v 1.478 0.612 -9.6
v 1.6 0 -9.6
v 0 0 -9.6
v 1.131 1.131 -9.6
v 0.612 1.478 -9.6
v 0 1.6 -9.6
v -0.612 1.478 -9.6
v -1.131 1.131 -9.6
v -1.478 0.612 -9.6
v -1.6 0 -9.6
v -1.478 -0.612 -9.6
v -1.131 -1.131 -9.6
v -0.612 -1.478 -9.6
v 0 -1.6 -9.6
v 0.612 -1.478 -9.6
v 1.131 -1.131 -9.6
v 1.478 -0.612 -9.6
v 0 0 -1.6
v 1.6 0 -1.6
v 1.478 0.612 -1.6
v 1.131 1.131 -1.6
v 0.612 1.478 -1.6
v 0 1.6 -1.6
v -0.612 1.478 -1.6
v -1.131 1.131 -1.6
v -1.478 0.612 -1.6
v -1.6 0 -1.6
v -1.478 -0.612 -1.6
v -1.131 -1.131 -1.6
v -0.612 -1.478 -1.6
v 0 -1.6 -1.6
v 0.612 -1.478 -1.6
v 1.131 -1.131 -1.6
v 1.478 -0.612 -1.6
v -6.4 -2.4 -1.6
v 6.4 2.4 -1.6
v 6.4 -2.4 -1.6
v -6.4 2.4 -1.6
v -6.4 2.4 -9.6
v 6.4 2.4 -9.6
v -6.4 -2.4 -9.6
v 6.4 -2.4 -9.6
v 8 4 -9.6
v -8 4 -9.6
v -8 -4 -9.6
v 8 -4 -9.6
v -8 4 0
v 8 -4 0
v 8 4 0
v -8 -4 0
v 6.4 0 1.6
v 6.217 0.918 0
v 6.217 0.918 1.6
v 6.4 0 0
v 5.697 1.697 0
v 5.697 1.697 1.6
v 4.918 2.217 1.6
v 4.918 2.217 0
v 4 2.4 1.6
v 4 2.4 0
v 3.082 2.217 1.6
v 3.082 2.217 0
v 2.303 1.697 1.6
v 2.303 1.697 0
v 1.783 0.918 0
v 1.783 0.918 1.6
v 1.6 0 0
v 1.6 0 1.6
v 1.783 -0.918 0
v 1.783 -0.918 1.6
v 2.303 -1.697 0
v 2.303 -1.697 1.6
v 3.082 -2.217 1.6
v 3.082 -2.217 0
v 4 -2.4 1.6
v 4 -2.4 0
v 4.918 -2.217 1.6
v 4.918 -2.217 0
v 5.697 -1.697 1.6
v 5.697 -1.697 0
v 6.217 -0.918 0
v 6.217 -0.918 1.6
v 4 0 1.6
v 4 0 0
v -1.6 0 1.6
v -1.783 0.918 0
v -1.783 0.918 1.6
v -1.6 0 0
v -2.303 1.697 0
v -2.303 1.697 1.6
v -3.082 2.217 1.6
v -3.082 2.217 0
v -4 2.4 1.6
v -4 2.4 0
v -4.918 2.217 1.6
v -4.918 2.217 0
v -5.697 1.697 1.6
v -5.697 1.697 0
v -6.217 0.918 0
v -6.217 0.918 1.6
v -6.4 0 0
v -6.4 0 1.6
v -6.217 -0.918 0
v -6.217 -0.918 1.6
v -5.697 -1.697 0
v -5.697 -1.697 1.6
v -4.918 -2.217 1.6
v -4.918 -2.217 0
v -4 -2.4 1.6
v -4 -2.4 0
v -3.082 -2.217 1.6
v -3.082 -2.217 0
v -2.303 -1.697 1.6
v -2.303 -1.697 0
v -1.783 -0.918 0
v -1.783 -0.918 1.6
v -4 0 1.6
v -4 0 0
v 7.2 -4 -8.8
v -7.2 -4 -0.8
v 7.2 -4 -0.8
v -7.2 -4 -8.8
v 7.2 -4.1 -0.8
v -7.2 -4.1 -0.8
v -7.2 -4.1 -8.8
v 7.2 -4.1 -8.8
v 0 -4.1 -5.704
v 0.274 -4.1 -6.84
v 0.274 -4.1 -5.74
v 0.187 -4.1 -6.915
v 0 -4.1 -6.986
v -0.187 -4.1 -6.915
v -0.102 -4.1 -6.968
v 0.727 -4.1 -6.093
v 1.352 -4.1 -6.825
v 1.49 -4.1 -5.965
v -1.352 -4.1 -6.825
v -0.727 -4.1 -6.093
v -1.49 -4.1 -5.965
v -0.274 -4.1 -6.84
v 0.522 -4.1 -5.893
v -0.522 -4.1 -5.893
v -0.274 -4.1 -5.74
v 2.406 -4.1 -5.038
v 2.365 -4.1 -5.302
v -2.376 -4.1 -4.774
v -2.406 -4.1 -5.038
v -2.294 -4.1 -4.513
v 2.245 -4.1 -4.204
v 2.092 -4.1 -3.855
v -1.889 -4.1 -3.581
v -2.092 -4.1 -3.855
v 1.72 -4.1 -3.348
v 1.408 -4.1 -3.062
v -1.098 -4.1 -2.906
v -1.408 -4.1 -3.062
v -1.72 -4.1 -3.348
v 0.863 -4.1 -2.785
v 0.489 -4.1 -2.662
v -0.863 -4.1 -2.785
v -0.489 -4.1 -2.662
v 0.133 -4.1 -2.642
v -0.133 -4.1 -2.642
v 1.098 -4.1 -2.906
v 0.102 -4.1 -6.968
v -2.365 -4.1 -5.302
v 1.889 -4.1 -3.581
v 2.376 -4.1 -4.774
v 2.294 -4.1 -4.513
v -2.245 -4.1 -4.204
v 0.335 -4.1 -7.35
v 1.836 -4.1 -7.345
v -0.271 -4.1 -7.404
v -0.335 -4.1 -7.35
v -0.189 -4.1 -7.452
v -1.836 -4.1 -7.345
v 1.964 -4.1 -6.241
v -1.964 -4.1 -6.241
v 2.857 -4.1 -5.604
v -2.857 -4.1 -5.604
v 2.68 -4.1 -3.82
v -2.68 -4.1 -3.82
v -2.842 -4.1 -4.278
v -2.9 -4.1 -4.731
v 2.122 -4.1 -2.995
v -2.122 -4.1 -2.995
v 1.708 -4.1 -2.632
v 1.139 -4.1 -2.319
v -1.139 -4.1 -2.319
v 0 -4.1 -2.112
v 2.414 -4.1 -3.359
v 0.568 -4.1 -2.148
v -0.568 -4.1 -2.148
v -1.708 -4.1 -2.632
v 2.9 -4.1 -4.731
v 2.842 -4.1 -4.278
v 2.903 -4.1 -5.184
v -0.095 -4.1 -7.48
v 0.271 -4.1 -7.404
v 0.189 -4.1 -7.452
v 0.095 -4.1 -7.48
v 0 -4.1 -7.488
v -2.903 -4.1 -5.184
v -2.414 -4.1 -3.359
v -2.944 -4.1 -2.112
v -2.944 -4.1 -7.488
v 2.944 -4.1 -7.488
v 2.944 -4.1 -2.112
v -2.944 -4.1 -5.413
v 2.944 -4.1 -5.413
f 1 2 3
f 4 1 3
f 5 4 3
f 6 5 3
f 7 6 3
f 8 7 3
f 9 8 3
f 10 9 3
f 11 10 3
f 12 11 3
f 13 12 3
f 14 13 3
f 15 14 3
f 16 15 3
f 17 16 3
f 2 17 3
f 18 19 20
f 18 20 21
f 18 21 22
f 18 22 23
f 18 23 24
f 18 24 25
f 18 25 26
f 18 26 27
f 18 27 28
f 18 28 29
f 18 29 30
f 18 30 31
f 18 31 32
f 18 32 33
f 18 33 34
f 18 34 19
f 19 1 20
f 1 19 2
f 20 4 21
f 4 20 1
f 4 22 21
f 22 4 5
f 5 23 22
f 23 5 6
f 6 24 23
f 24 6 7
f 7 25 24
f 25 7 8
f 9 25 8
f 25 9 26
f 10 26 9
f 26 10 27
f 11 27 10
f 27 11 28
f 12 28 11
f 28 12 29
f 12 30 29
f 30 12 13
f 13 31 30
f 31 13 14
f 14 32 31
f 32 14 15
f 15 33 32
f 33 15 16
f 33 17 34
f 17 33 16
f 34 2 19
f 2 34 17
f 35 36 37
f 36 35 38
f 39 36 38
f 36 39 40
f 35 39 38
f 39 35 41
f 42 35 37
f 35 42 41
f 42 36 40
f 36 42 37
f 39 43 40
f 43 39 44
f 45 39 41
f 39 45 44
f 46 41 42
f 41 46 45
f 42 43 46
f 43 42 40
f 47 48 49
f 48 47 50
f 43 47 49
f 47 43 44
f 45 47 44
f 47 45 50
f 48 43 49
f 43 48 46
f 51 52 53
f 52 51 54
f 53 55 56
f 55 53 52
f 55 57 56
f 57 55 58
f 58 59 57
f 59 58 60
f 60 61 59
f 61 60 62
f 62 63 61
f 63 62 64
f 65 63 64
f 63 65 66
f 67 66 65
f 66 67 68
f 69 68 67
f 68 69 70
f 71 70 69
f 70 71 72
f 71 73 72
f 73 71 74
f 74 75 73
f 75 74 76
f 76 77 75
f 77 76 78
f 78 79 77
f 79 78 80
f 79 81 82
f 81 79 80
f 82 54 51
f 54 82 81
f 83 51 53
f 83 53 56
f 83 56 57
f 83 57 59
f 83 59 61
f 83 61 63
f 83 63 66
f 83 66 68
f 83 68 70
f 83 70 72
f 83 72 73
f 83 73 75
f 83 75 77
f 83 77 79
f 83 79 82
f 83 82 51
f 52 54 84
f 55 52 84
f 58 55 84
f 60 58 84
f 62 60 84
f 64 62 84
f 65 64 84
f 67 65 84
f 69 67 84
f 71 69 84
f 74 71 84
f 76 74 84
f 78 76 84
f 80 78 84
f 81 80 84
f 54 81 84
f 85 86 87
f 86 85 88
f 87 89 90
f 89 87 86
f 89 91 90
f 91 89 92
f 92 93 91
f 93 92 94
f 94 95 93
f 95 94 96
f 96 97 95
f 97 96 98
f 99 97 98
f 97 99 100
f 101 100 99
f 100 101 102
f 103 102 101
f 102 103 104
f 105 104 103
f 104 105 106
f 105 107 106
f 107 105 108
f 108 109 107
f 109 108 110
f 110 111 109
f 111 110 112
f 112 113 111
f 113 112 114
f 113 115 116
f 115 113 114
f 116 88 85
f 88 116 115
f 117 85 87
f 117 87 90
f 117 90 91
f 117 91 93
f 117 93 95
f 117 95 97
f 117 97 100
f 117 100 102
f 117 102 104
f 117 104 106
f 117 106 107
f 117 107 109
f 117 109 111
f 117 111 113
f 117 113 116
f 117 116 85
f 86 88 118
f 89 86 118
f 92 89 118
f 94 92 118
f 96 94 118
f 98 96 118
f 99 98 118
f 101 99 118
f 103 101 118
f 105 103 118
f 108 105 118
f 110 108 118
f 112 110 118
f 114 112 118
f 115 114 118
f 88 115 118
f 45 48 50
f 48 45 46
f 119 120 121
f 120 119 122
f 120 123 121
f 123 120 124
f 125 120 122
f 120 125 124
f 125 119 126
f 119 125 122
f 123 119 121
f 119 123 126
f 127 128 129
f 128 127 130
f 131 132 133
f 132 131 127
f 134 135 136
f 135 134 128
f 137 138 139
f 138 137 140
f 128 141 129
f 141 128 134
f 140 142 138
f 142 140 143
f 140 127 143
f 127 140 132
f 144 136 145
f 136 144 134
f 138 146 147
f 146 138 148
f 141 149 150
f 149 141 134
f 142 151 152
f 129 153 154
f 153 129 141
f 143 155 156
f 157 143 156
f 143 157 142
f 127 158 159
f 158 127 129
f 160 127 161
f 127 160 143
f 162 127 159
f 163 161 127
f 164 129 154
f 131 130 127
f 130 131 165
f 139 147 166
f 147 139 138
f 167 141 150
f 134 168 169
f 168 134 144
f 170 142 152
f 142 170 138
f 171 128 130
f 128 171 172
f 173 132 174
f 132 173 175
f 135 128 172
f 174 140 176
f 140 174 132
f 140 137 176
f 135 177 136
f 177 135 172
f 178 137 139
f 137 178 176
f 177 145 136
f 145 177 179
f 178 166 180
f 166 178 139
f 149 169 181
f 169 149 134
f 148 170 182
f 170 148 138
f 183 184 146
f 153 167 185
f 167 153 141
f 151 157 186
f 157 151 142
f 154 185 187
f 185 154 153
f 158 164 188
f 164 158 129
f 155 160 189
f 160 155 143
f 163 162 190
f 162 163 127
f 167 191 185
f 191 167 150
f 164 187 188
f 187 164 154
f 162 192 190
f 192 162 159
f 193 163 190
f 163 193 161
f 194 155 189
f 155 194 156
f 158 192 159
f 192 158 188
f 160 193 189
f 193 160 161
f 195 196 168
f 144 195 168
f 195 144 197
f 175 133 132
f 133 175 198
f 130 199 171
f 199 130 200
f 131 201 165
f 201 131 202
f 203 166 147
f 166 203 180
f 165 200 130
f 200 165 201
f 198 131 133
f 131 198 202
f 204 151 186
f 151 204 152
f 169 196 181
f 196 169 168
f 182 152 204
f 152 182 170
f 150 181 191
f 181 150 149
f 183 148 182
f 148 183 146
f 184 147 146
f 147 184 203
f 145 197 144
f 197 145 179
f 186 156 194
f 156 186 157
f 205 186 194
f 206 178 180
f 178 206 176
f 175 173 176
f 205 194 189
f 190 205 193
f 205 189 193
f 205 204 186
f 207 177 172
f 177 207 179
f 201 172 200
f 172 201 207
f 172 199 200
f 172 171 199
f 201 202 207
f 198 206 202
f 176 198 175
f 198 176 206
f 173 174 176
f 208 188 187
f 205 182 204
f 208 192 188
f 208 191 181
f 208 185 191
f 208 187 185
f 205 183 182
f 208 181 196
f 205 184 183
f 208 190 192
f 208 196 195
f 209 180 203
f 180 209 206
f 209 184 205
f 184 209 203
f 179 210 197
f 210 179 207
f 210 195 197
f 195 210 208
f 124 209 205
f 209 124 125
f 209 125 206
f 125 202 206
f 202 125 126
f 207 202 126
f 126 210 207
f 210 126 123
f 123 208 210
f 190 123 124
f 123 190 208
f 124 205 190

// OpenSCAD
// file: ../p/4-4edge.scad
use <../lib.scad>
function ldraw_lib__4_4edge() = [
// 0 Circle 1.0
// 0 Name: 4-4edge.dat
// 0 Author: James Jessiman
// 0 !LDRAW_ORG Primitive UPDATE 2017-01
// 0 !LICENSE Licensed under CC BY 2.0 and CC BY 4.0 : see CAreadme.txt
// 
// 0 BFC CERTIFY CCW
  [0,"BFC","CERTIFY"],
  [0,"BFC","CCW"],
// 
// 0 !HISTORY 1998-12-15 [PTadmin] Official Update 1998-10
// 0 !HISTORY 2005-12-28 [PTadmin] Official Update 2005-01
// 0 !HISTORY 2007-06-24 [PTadmin] Header formatted for Contributor Agreement
// 0 !HISTORY 2008-07-01 [PTadmin] Official Update 2008-01
// 0 !HISTORY 2017-01-15 [Steffen] BFCed
// 0 !HISTORY 2017-12-30 [PTadmin] Official Update 2017-01
// 
// 
// 2 24 1 0 0 0.9239 0 0.3827
  [2,24,1,0,0,0.9239,0,0.3827],
// 2 24 0.9239 0 0.3827 0.7071 0 0.7071
  [2,24,0.9239,0,0.3827,0.7071,0,0.7071],
// 2 24 0.7071 0 0.7071 0.3827 0 0.9239
  [2,24,0.7071,0,0.7071,0.3827,0,0.9239],
// 2 24 0.3827 0 0.9239 0 0 1
  [2,24,0.3827,0,0.9239,0,0,1],
// 2 24 0 0 1 -0.3827 0 0.9239
  [2,24,0,0,1,-0.3827,0,0.9239],
// 2 24 -0.3827 0 0.9239 -0.7071 0 0.7071
  [2,24,-0.3827,0,0.9239,-0.7071,0,0.7071],
// 2 24 -0.7071 0 0.7071 -0.9239 0 0.3827
  [2,24,-0.7071,0,0.7071,-0.9239,0,0.3827],
// 2 24 -0.9239 0 0.3827 -1 0 -0
  [2,24,-0.9239,0,0.3827,-1,0,-0],
// 2 24 -1 0 -0 -0.9239 0 -0.3827
  [2,24,-1,0,-0,-0.9239,0,-0.3827],
// 2 24 -0.9239 0 -0.3827 -0.7071 0 -0.7071
  [2,24,-0.9239,0,-0.3827,-0.7071,0,-0.7071],
// 2 24 -0.7071 0 -0.7071 -0.3827 0 -0.9239
  [2,24,-0.7071,0,-0.7071,-0.3827,0,-0.9239],
// 2 24 -0.3827 0 -0.9239 0 0 -1
  [2,24,-0.3827,0,-0.9239,0,0,-1],
// 2 24 0 0 -1 0.3827 0 -0.9239
  [2,24,0,0,-1,0.3827,0,-0.9239],
// 2 24 0.3827 0 -0.9239 0.7071 0 -0.7071
  [2,24,0.3827,0,-0.9239,0.7071,0,-0.7071],
// 2 24 0.7071 0 -0.7071 0.9239 0 -0.3827
  [2,24,0.7071,0,-0.7071,0.9239,0,-0.3827],
// 2 24 0.9239 0 -0.3827 1 0 0
  [2,24,0.9239,0,-0.3827,1,0,0],
];
module ldraw_lib__4_4edge(step=0, col=false, unit=2/5, alt=false, line=0.2, solid=!$preview)
    makepoly(ldraw_lib__4_4edge(), step=step, col=col, unit=unit, alt=alt, line=line, solid=solid);
ldraw_lib__4_4edge(line=0.2);
// file: ../p/4-4disc.scad
use <../lib.scad>
function ldraw_lib__4_4disc() = [
// 0 Disc 1.0
// 0 Name: 4-4disc.dat
// 0 Author: James Jessiman
// 0 !LDRAW_ORG Primitive UPDATE 2002-02
// 0 !LICENSE Licensed under CC BY 2.0 and CC BY 4.0 : see CAreadme.txt
// 
// 0 BFC CERTIFY CCW
  [0,"BFC","CERTIFY"],
  [0,"BFC","CCW"],
// 
// 0 !HISTORY 1998-12-15 [PTadmin] Official Update 1998-10
// 0 !HISTORY 2002-03-23 [sbliss] Added BFC statement
// 0 !HISTORY 2002-04-25 [PTadmin] Official Update 2002-02
// 0 !HISTORY 2007-06-24 [PTadmin] Header formatted for Contributor Agreement
// 0 !HISTORY 2008-07-01 [PTadmin] Official Update 2008-01
// 
// 
// 3 16 0 0 0 1 0 0 0.9239 0 0.3827
  [3,16,0,0,0,1,0,0,0.9239,0,0.3827],
// 3 16 0 0 0 0.9239 0 0.3827 0.7071 0 0.7071
  [3,16,0,0,0,0.9239,0,0.3827,0.7071,0,0.7071],
// 3 16 0 0 0 0.7071 0 0.7071 0.3827 0 0.9239
  [3,16,0,0,0,0.7071,0,0.7071,0.3827,0,0.9239],
// 3 16 0 0 0 0.3827 0 0.9239 0 0 1
  [3,16,0,0,0,0.3827,0,0.9239,0,0,1],
// 3 16 0 0 0 0 0 1 -0.3827 0 0.9239
  [3,16,0,0,0,0,0,1,-0.3827,0,0.9239],
// 3 16 0 0 0 -0.3827 0 0.9239 -0.7071 0 0.7071
  [3,16,0,0,0,-0.3827,0,0.9239,-0.7071,0,0.7071],
// 3 16 0 0 0 -0.7071 0 0.7071 -0.9239 0 0.3827
  [3,16,0,0,0,-0.7071,0,0.7071,-0.9239,0,0.3827],
// 3 16 0 0 0 -0.9239 0 0.3827 -1 0 -0
  [3,16,0,0,0,-0.9239,0,0.3827,-1,0,-0],
// 3 16 0 0 0 -1 0 -0 -0.9239 0 -0.3827
  [3,16,0,0,0,-1,0,-0,-0.9239,0,-0.3827],
// 3 16 0 0 0 -0.9239 0 -0.3827 -0.7071 0 -0.7071
  [3,16,0,0,0,-0.9239,0,-0.3827,-0.7071,0,-0.7071],
// 3 16 0 0 0 -0.7071 0 -0.7071 -0.3827 0 -0.9239
  [3,16,0,0,0,-0.7071,0,-0.7071,-0.3827,0,-0.9239],
// 3 16 0 0 0 -0.3827 0 -0.9239 0 0 -1
  [3,16,0,0,0,-0.3827,0,-0.9239,0,0,-1],
// 3 16 0 0 0 0 0 -1 0.3827 0 -0.9239
  [3,16,0,0,0,0,0,-1,0.3827,0,-0.9239],
// 3 16 0 0 0 0.3827 0 -0.9239 0.7071 0 -0.7071
  [3,16,0,0,0,0.3827,0,-0.9239,0.7071,0,-0.7071],
// 3 16 0 0 0 0.7071 0 -0.7071 0.9239 0 -0.3827
  [3,16,0,0,0,0.7071,0,-0.7071,0.9239,0,-0.3827],
// 3 16 0 0 0 0.9239 0 -0.3827 1 0 0
  [3,16,0,0,0,0.9239,0,-0.3827,1,0,0],
// 0
];
module ldraw_lib__4_4disc(step=0, col=false, unit=2/5, alt=false, line=0.2, solid=!$preview)
    makepoly(ldraw_lib__4_4disc(), step=step, col=col, unit=unit, alt=alt, line=line, solid=solid);
ldraw_lib__4_4disc(line=0.2);
// file: ../p/4-4cyli.scad
use <../lib.scad>
$fa=1; $fs=0.2;
function ldraw_lib__4_4cyli(realsolid=false) = [
// 0 Cylinder 1.0
// 0 Name: 4-4cyli.dat
// 0 Author: James Jessiman
// 0 !LDRAW_ORG Primitive UPDATE 2005-01
// 0 !LICENSE Licensed under CC BY 2.0 and CC BY 4.0 : see CAreadme.txt
// 
// 0 BFC CERTIFY CCW
  [0,"BFC","CERTIFY"],
  [0,"BFC","CCW"],
// 
// 0 !HISTORY 1998-12-15 [PTadmin] Official Update 1998-10
// 0 !HISTORY 2002-03-23 [sbliss] Added BFC statement; merged headers from files in distributions LDraw 0.27 and Complete.
// 0 !HISTORY 2002-04-25 [PTadmin] Official Update 2002-02
// 0 !HISTORY 2004-12-14 [guyvivan] BFC CCW
// 0 !HISTORY 2005-12-28 [PTadmin] Official Update 2005-01
// 0 !HISTORY 2007-06-24 [PTadmin] Header formatted for Contributor Agreement
// 0 !HISTORY 2008-07-01 [PTadmin] Official Update 2008-01
// 
// 
// 4 16 1 1 0 0.9239 1 0.3827 0.9239 0 0.3827 1 0 0
  [4,16,1,1,0,0.9239,1,0.3827,0.9239,0,0.3827,1,0,0],
// 5 24 1 0 0 1 1 0 0.9239 0 0.3827 0.9239 0 -0.3827
  [5,24,1,0,0,1,1,0,0.9239,0,0.3827,0.9239,0,-0.3827],
// 4 16 0.9239 1 0.3827 0.7071 1 0.7071 0.7071 0 0.7071 0.9239 0 0.3827
  [4,16,0.9239,1,0.3827,0.7071,1,0.7071,0.7071,0,0.7071,0.9239,0,0.3827],
// 5 24 0.9239 0 0.3827 0.9239 1 0.3827 0.7071 0 0.7071 1 0 0
  [5,24,0.9239,0,0.3827,0.9239,1,0.3827,0.7071,0,0.7071,1,0,0],
// 4 16 0.7071 1 0.7071 0.3827 1 0.9239 0.3827 0 0.9239 0.7071 0 0.7071
  [4,16,0.7071,1,0.7071,0.3827,1,0.9239,0.3827,0,0.9239,0.7071,0,0.7071],
// 5 24 0.7071 0 0.7071 0.7071 1 0.7071 0.3827 0 0.9239 0.9239 0 0.3827
  [5,24,0.7071,0,0.7071,0.7071,1,0.7071,0.3827,0,0.9239,0.9239,0,0.3827],
// 4 16 0.3827 1 0.9239 0 1 1 0 0 1 0.3827 0 0.9239
  [4,16,0.3827,1,0.9239,0,1,1,0,0,1,0.3827,0,0.9239],
// 5 24 0.3827 0 0.9239 0.3827 1 0.9239 0 0 1 0.7071 0 0.7071
  [5,24,0.3827,0,0.9239,0.3827,1,0.9239,0,0,1,0.7071,0,0.7071],
// 4 16 0 1 1 -0.3827 1 0.9239 -0.3827 0 0.9239 0 0 1
  [4,16,0,1,1,-0.3827,1,0.9239,-0.3827,0,0.9239,0,0,1],
// 5 24 0 0 1 0 1 1 -0.3827 0 0.9239 0.3827 0 0.9239
  [5,24,0,0,1,0,1,1,-0.3827,0,0.9239,0.3827,0,0.9239],
// 4 16 -0.3827 1 0.9239 -0.7071 1 0.7071 -0.7071 0 0.7071 -0.3827 0 0.9239
  [4,16,-0.3827,1,0.9239,-0.7071,1,0.7071,-0.7071,0,0.7071,-0.3827,0,0.9239],
// 5 24 -0.3827 0 0.9239 -0.3827 1 0.9239 -0.7071 0 0.7071 0 0 1
  [5,24,-0.3827,0,0.9239,-0.3827,1,0.9239,-0.7071,0,0.7071,0,0,1],
// 4 16 -0.7071 1 0.7071 -0.9239 1 0.3827 -0.9239 0 0.3827 -0.7071 0 0.7071
  [4,16,-0.7071,1,0.7071,-0.9239,1,0.3827,-0.9239,0,0.3827,-0.7071,0,0.7071],
// 5 24 -0.7071 0 0.7071 -0.7071 1 0.7071 -0.9239 0 0.3827 -0.3827 0 0.9239
  [5,24,-0.7071,0,0.7071,-0.7071,1,0.7071,-0.9239,0,0.3827,-0.3827,0,0.9239],
// 4 16 -0.9239 1 0.3827 -1 1 0 -1 0 0 -0.9239 0 0.3827
  [4,16,-0.9239,1,0.3827,-1,1,0,-1,0,0,-0.9239,0,0.3827],
// 5 24 -0.9239 0 0.3827 -0.9239 1 0.3827 -1 0 0 -0.7071 0 0.7071
  [5,24,-0.9239,0,0.3827,-0.9239,1,0.3827,-1,0,0,-0.7071,0,0.7071],
// 4 16 -1 1 0 -0.9239 1 -0.3827 -0.9239 0 -0.3827 -1 0 0
  [4,16,-1,1,0,-0.9239,1,-0.3827,-0.9239,0,-0.3827,-1,0,0],
// 5 24 -1 0 0 -1 1 0 -0.9239 0 -0.3827 -0.9239 0 0.3827
  [5,24,-1,0,0,-1,1,0,-0.9239,0,-0.3827,-0.9239,0,0.3827],
// 4 16 -0.9239 1 -0.3827 -0.7071 1 -0.7071 -0.7071 0 -0.7071 -0.9239 0 -0.3827
  [4,16,-0.9239,1,-0.3827,-0.7071,1,-0.7071,-0.7071,0,-0.7071,-0.9239,0,-0.3827],
// 5 24 -0.9239 0 -0.3827 -0.9239 1 -0.3827 -0.7071 0 -0.7071 -1 0 0
  [5,24,-0.9239,0,-0.3827,-0.9239,1,-0.3827,-0.7071,0,-0.7071,-1,0,0],
// 4 16 -0.7071 1 -0.7071 -0.3827 1 -0.9239 -0.3827 0 -0.9239 -0.7071 0 -0.7071
  [4,16,-0.7071,1,-0.7071,-0.3827,1,-0.9239,-0.3827,0,-0.9239,-0.7071,0,-0.7071],
// 5 24 -0.7071 0 -0.7071 -0.7071 1 -0.7071 -0.3827 0 -0.9239 -0.9239 0 -0.3827
  [5,24,-0.7071,0,-0.7071,-0.7071,1,-0.7071,-0.3827,0,-0.9239,-0.9239,0,-0.3827],
// 4 16 -0.3827 1 -0.9239 0 1 -1 0 0 -1 -0.3827 0 -0.9239
  [4,16,-0.3827,1,-0.9239,0,1,-1,0,0,-1,-0.3827,0,-0.9239],
// 5 24 -0.3827 0 -0.9239 -0.3827 1 -0.9239 0 0 -1 -0.7071 0 -0.7071
  [5,24,-0.3827,0,-0.9239,-0.3827,1,-0.9239,0,0,-1,-0.7071,0,-0.7071],
// 4 16 0 1 -1 0.3827 1 -0.9239 0.3827 0 -0.9239 0 0 -1
  [4,16,0,1,-1,0.3827,1,-0.9239,0.3827,0,-0.9239,0,0,-1],
// 5 24 0 0 -1 0 1 -1 0.3827 0 -0.9239 -0.3827 0 -0.9239
  [5,24,0,0,-1,0,1,-1,0.3827,0,-0.9239,-0.3827,0,-0.9239],
// 4 16 0.3827 1 -0.9239 0.7071 1 -0.7071 0.7071 0 -0.7071 0.3827 0 -0.9239
  [4,16,0.3827,1,-0.9239,0.7071,1,-0.7071,0.7071,0,-0.7071,0.3827,0,-0.9239],
// 5 24 0.3827 0 -0.9239 0.3827 1 -0.9239 0.7071 0 -0.7071 0 0 -1
  [5,24,0.3827,0,-0.9239,0.3827,1,-0.9239,0.7071,0,-0.7071,0,0,-1],
// 4 16 0.7071 1 -0.7071 0.9239 1 -0.3827 0.9239 0 -0.3827 0.7071 0 -0.7071
  [4,16,0.7071,1,-0.7071,0.9239,1,-0.3827,0.9239,0,-0.3827,0.7071,0,-0.7071],
// 5 24 0.7071 0 -0.7071 0.7071 1 -0.7071 0.9239 0 -0.3827 0.3827 0 -0.9239
  [5,24,0.7071,0,-0.7071,0.7071,1,-0.7071,0.9239,0,-0.3827,0.3827,0,-0.9239],
// 4 16 0.9239 1 -0.3827 1 1 0 1 0 0 0.9239 0 -0.3827
  [4,16,0.9239,1,-0.3827,1,1,0,1,0,0,0.9239,0,-0.3827],
// 5 24 0.9239 0 -0.3827 0.9239 1 -0.3827 1 0 0 0.7071 0 -0.7071
  [5,24,0.9239,0,-0.3827,0.9239,1,-0.3827,1,0,0,0.7071,0,-0.7071],
// 0
];
module ldraw_lib__4_4cyli(step=0, col=false, unit=2/5, alt=false, line=0.2, solid=!$preview)
    makepoly(ldraw_lib__4_4cyli(solid), step=step, col=col, unit=unit, alt=alt, line=line, solid=solid);
ldraw_lib__4_4cyli(line=0.2);
// file: ../p/stud3.scad
use <../lib.scad>
use <4-4cyli.scad>
use <4-4disc.scad>
use <4-4edge.scad>
function ldraw_lib__stud3() = [
// 0 Stud Tube Solid
// 0 Name: stud3.dat
// 0 Author: James Jessiman
// 0 !LDRAW_ORG Primitive UPDATE 2012-01
// 0 !LICENSE Licensed under CC BY 4.0 : see CAreadme.txt
// 
// 0 BFC CERTIFY CCW
  [0,"BFC","CERTIFY"],
  [0,"BFC","CCW"],
// 
// 0 !HISTORY 2002-04-04 [sbliss] Modified for BFC compliance
// 0 !HISTORY 2002-04-25 [PTadmin] Official Update 2002-02
// 0 !HISTORY 2007-06-24 [PTadmin] Header formatted for Contributor Agreement
// 0 !HISTORY 2008-07-01 [PTadmin] Official Update 2008-01
// 0 !HISTORY 2012-02-16 [Philo] Changed to CCW
// 0 !HISTORY 2012-03-30 [PTadmin] Official Update 2012-01
// 
// 
// 1 16 0 -4 0 4 0 0 0 1 0 0 0 4 4-4edge.dat
  [1,16,0,-4,0,4,0,0,0,1,0,0,0,4, ldraw_lib__4_4edge()],
// 1 16 0 0 0 4 0 0 0 1 0 0 0 4 4-4edge.dat
  [1,16,0,0,0,4,0,0,0,1,0,0,0,4, ldraw_lib__4_4edge()],
// 1 16 0 -4 0 4 0 0 0 1 0 0 0 4 4-4disc.dat
  [1,16,0,-4,0,4,0,0,0,1,0,0,0,4, ldraw_lib__4_4disc()],
  [-1,16,0,0,0,4,0,0,0,-1,0,0,0,4, ldraw_lib__4_4disc()],
// 1 16 0 -4 0 4 0 0 0 4 0 0 0 4 4-4cyli.dat
  [1,16,0,-4,0,4,0,0,0,4,0,0,0,4, ldraw_lib__4_4cyli()],
];
module ldraw_lib__stud3(step=0, col=false, unit=2/5, alt=false, line=0.2, solid=!$preview)
    makepoly(ldraw_lib__stud3(), step=step, col=col, unit=unit, alt=alt, line=line, solid=solid);
ldraw_lib__stud3(line=0.2);
// file: ../p/stud.scad
use <../lib.scad>
use <4-4cyli.scad>
use <4-4disc.scad>
use <4-4edge.scad>
function ldraw_lib__stud() = [
// 0 Stud
// 0 Name: stud.dat
// 0 Author: James Jessiman
// 0 !LDRAW_ORG Primitive UPDATE 2012-01
// 0 !LICENSE Licensed under CC BY 4.0 : see CAreadme.txt
// 
// 0 BFC CERTIFY CCW
  [0,"BFC","CERTIFY"],
  [0,"BFC","CCW"],
// 
// 0 !HISTORY 2002-04-04 [sbliss] Modified for BFC compliance
// 0 !HISTORY 2002-04-25 [PTadmin] Official Update 2002-02
// 0 !HISTORY 2007-06-24 [PTadmin] Header formatted for Contributor Agreement
// 0 !HISTORY 2008-07-01 [PTadmin] Official Update 2008-01
// 0 !HISTORY 2012-02-16 [Philo] Changed to CCW
// 0 !HISTORY 2012-03-30 [PTadmin] Official Update 2012-01
// 
// 
// 1 16 0 0 0 6 0 0 0 1 0 0 0 6 4-4edge.dat
  [1,16,0,0,0,6,0,0,0,1,0,0,0,6, ldraw_lib__4_4edge()],
// 1 16 0 -4 0 6 0 0 0 1 0 0 0 6 4-4edge.dat
  [1,16,0,-4,0,6,0,0,0,1,0,0,0,6, ldraw_lib__4_4edge()],
// 1 16 0 0 0 6 0 0 0 -4 0 0 0 6 4-4cyli.dat
  [1,16,0,0,0,6,0,0,0,-4,0,0,0,6, ldraw_lib__4_4cyli()],
// 1 16 0 -4 0 6 0 0 0 1 0 0 0 6 4-4disc.dat
  [1,16,0,-4,0,6,0,0,0,1,0,0,0,6, ldraw_lib__4_4disc()],
  [-1,16,0,0,0,6,0,0,0,-1,0,0,0,6, ldraw_lib__4_4disc()],
];
module ldraw_lib__stud(step=0, col=false, unit=2/5, alt=false, line=0.2, solid=!$preview)
    makepoly(ldraw_lib__stud(), step=step, col=col, unit=unit, alt=alt, line=line, solid=solid);
ldraw_lib__stud(line=0.2);
// file: ../p/box5.scad
use <../lib.scad>
function ldraw_lib__box5() = [
// 0 Box with 5 Faces and All Edges
// 0 Name: box5.dat
// 0 Author: James Jessiman
// 0 !LDRAW_ORG Primitive UPDATE 2012-01
// 0 !LICENSE Licensed under CC BY 2.0 and CC BY 4.0 : see CAreadme.txt
// 
// 0 BFC CERTIFY CCW
  [0,"BFC","CERTIFY"],
  [0,"BFC","CCW"],
// 
// 0 !HISTORY 2002-04-03 [sbliss] Modified for BFC compliance
// 0 !HISTORY 2002-04-25 [PTadmin] Official Update 2002-02
// 0 !HISTORY 2007-06-24 [PTadmin] Header formatted for Contributor Agreement
// 0 !HISTORY 2008-07-01 [PTadmin] Official Update 2008-01
// 0 !HISTORY 2012-02-16 [Philo] Changed to CCW
// 0 !HISTORY 2012-03-30 [PTadmin] Official Update 2012-01
// 
// 
// 2 24 1 1 1 -1 1 1
  [2,24,1,1,1,-1,1,1],
// 2 24 -1 1 1 -1 1 -1
  [2,24,-1,1,1,-1,1,-1],
// 2 24 -1 1 -1 1 1 -1
  [2,24,-1,1,-1,1,1,-1],
// 2 24 1 1 -1 1 1 1
  [2,24,1,1,-1,1,1,1],
// 2 24 1 0 1 -1 0 1
  [2,24,1,0,1,-1,0,1],
// 2 24 -1 0 1 -1 0 -1
  [2,24,-1,0,1,-1,0,-1],
// 2 24 -1 0 -1 1 0 -1
  [2,24,-1,0,-1,1,0,-1],
// 2 24 1 0 -1 1 0 1
  [2,24,1,0,-1,1,0,1],
// 2 24 1 0 1 1 1 1
  [2,24,1,0,1,1,1,1],
// 2 24 -1 0 1 -1 1 1
  [2,24,-1,0,1,-1,1,1],
// 2 24 1 0 -1 1 1 -1
  [2,24,1,0,-1,1,1,-1],
// 2 24 -1 0 -1 -1 1 -1
  [2,24,-1,0,-1,-1,1,-1],
// 4 16 -1 1 1 1 1 1 1 1 -1 -1 1 -1
  [4,16,-1,1,1,1,1,1,1,1,-1,-1,1,-1],
// 4 16 -1 1 1 -1 0 1 1 0 1 1 1 1
  [4,16,-1,1,1,-1,0,1,1,0,1,1,1,1],
// 4 16 -1 1 -1 -1 0 -1 -1 0 1 -1 1 1
  [4,16,-1,1,-1,-1,0,-1,-1,0,1,-1,1,1],
// 4 16 1 1 -1 1 0 -1 -1 0 -1 -1 1 -1
  [4,16,1,1,-1,1,0,-1,-1,0,-1,-1,1,-1],
// 4 16 1 1 1 1 0 1 1 0 -1 1 1 -1
  [4,16,1,1,1,1,0,1,1,0,-1,1,1,-1],
];
makepoly(ldraw_lib__box5(), line=0.2);
// file: ../p/box4t.scad
use <../lib.scad>
function ldraw_lib__box4t() = [
// 0 Box with 4 Adjacent Faces and All Edges
// 0 Name: box4t.dat
// 0 Author: Tore Eriksson [Tore_Eriksson]
// 0 !LDRAW_ORG Primitive UPDATE 2003-02
// 0 !LICENSE Licensed under CC BY 2.0 and CC BY 4.0 : see CAreadme.txt
// 
// 0 BFC CERTIFY CCW
  [0,"BFC","CERTIFY"],
  [0,"BFC","CCW"],
// 
// 0 !HISTORY 1997-09-29 [PTadmin] Official Update 1997-15
// 0 !HISTORY 2002-08-31 [izanette] Modified with WINDZ for BFC compliance
// 0 !HISTORY 2003-08-01 [PTadmin] Official Update 2003-02
// 0 !HISTORY 2007-06-24 [PTadmin] Header formatted for Contributor Agreement
// 0 !HISTORY 2008-07-01 [PTadmin] Official Update 2008-01
// 
// 
// 2 24 1 1 1 -1 1 1
  [2,24,1,1,1,-1,1,1],
// 2 24 -1 1 1 -1 1 -1
  [2,24,-1,1,1,-1,1,-1],
// 2 24 -1 1 -1 1 1 -1
  [2,24,-1,1,-1,1,1,-1],
// 2 24 1 1 -1 1 1 1
  [2,24,1,1,-1,1,1,1],
// 2 24 1 0 1 -1 0 1
  [2,24,1,0,1,-1,0,1],
// 2 24 -1 0 1 -1 0 -1
  [2,24,-1,0,1,-1,0,-1],
// 2 24 -1 0 -1 1 0 -1
  [2,24,-1,0,-1,1,0,-1],
// 2 24 1 0 -1 1 0 1
  [2,24,1,0,-1,1,0,1],
// 2 24 1 0 1 1 1 1
  [2,24,1,0,1,1,1,1],
// 2 24 -1 0 1 -1 1 1
  [2,24,-1,0,1,-1,1,1],
// 2 24 1 0 -1 1 1 -1
  [2,24,1,0,-1,1,1,-1],
// 2 24 -1 0 -1 -1 1 -1
  [2,24,-1,0,-1,-1,1,-1],
// 4 16 1 1 1 1 1 -1 -1 1 -1 -1 1 1
  [4,16,1,1,1,1,1,-1,-1,1,-1,-1,1,1],
// 4 16 1 1 1 -1 1 1 -1 0 1 1 0 1
  [4,16,1,1,1,-1,1,1,-1,0,1,1,0,1],
// 4 16 -1 1 1 -1 1 -1 -1 0 -1 -1 0 1
  [4,16,-1,1,1,-1,1,-1,-1,0,-1,-1,0,1],
// 0 4 16 -1 1 -1 -1 0 -1 1 0 -1 1 1 -1
// 4 16 1 1 -1 1 1 1 1 0 1 1 0 -1
  [4,16,1,1,-1,1,1,1,1,0,1,1,0,-1],
// 0
];
makepoly(ldraw_lib__box4t(), line=0.2);
// file: s/3004s01.scad
use <../../lib.scad>
use <../../p/box4t.scad>
use <../../p/box5.scad>
use <../../p/stud.scad>
use <../../p/stud3.scad>
$fa=1; $fs=0.2;
function ldraw_lib__s__3004s01(realsolid=false) = [
// 0 ~Brick  1 x  2 without Front Face
// 0 Name: s\3004s01.dat
// 0 Author: James Jessiman
// 0 !LDRAW_ORG Subpart UPDATE 2003-03
// 0 !LICENSE Licensed under CC BY 2.0 and CC BY 4.0 : see CAreadme.txt
// 
// 0 BFC CERTIFY CCW
  [0,"BFC","CERTIFY"],
  [0,"BFC","CCW"],
// 
// 0 !HISTORY 2003-09-07 [jriley] Subfiling, BFC
// 0 !HISTORY 2003-12-19 [PTadmin] Official Update 2003-03
// 0 !HISTORY 2007-08-29 [PTadmin] Header formatted for Contributor Agreement
// 0 !HISTORY 2008-07-01 [PTadmin] Official Update 2008-01
// 
// 
// 1 16 0 4 0 1 0 0 0 -5 0 0 0 1 stud3.dat
  [1,16,0,4,0,1,0,0,0,-5,0,0,0,1, ldraw_lib__stud3(realsolid)],
// 0 BFC INVERTNEXT
  [0,"BFC","INVERTNEXT"],
// 1 16 0 24 0 16 0 0 0 -20 0 0 0 6 box5.dat
  [1,16,0,24,0,16,0,0,0,-20,0,0,0,6, ldraw_lib__box5(realsolid)],
// 4 16 20 24 10 16 24 6 -16 24 6 -20 24 10
  [4,16,20,24,10,16,24,6,-16,24,6,-20,24,10],
// 4 16 -20 24 10 -16 24 6 -16 24 -6 -20 24 -10
  [4,16,-20,24,10,-16,24,6,-16,24,-6,-20,24,-10],
// 4 16 -20 24 -10 -16 24 -6 16 24 -6 20 24 -10
  [4,16,-20,24,-10,-16,24,-6,16,24,-6,20,24,-10],
// 4 16 20 24 -10 16 24 -6 16 24 6 20 24 10
  [4,16,20,24,-10,16,24,-6,16,24,6,20,24,10],
// 1 16 0 24 0 20 0 0 0 -24 0 0 0 10 box4t.dat
  [1,16,0,24,0,20,0,0,0,-24,0,0,0,10, ldraw_lib__box4t(realsolid)],
// 1 16 10 0 0 1 0 0 0 1 0 0 0 1 stud.dat
  [1,16,10,0,0,1,0,0,0,1,0,0,0,1, ldraw_lib__stud(realsolid)],
// 1 16 -10 0 0 1 0 0 0 1 0 0 0 1 stud.dat
  [1,16,-10,0,0,1,0,0,0,1,0,0,0,1, ldraw_lib__stud(realsolid)],
// 0
];
module ldraw_lib__s__3004s01(step=0, col=false, unit=2/5, alt=false, line=0.2, solid=!$preview)
    makepoly(ldraw_lib__s__3004s01(solid), step=step, col=col, unit=unit, alt=alt, line=line, solid=solid);
ldraw_lib__s__3004s01(line=0.2);
// file: ../p/box5-12.scad
use <../lib.scad>
function ldraw_lib__box5_12() = [
// 0 Box with 5 Faces without Any Edges
// 0 Name: box5-12.dat
// 0 Author: Chris Dee [cwdee]
// 0 !LDRAW_ORG Primitive UPDATE 2009-02
// 0 !LICENSE Licensed under CC BY 2.0 and CC BY 4.0 : see CAreadme.txt
// 
// 0 BFC CERTIFY CCW
  [0,"BFC","CERTIFY"],
  [0,"BFC","CCW"],
// 
// 0 !HISTORY 2009-09-03 [PTadmin] Official Update 2009-02
// 
// 
// 4 16 1 1 1 1 1 -1 -1 1 -1 -1 1 1
  [4,16,1,1,1,1,1,-1,-1,1,-1,-1,1,1],
// 4 16 -1 0 1 1 0 1 1 1 1 -1 1 1
  [4,16,-1,0,1,1,0,1,1,1,1,-1,1,1],
// 4 16 -1 0 -1 -1 0 1 -1 1 1 -1 1 -1
  [4,16,-1,0,-1,-1,0,1,-1,1,1,-1,1,-1],
// 4 16 1 0 -1 -1 0 -1 -1 1 -1 1 1 -1
  [4,16,1,0,-1,-1,0,-1,-1,1,-1,1,1,-1],
// 4 16 1 0 1 1 0 -1 1 1 -1 1 1 1
  [4,16,1,0,1,1,0,-1,1,1,-1,1,1,1],
// 0
];
module ldraw_lib__box5_12(step=0, col=false, unit=2/5, alt=false, line=0.2, solid=!$preview)
    makepoly(ldraw_lib__box5_12(), step=step, col=col, unit=unit, alt=alt, line=line, solid=solid);
ldraw_lib__box5_12(line=0.2);
// file: 3004.scad
use <../lib.scad>
use <s/3004s01.scad>
function ldraw_lib__3004() = [
// 0 Brick  1 x  2
// 0 Name: 3004.dat
// 0 Author: James Jessiman
// 0 !LDRAW_ORG Part UPDATE 2022-05
// 0 !LICENSE Licensed under CC BY 2.0 and CC BY 4.0 : see CAreadme.txt
// 
// 0 BFC CERTIFY CCW
  [0,"BFC","CERTIFY"],
  [0,"BFC","CCW"],
// 
// 0 !HISTORY 2001-10-26 [PTadmin] Official Update 2001-01
// 0 !HISTORY 2002-05-07 {unknown} BFC Certification
// 0 !HISTORY 2002-06-11 [PTadmin] Official Update 2002-03
// 0 !HISTORY 2007-05-07 [PTadmin] Header formatted for Contributor Agreement
// 0 !HISTORY 2008-07-01 [PTadmin] Official Update 2008-01
// 0 !HISTORY 2022-08-04 [MagFors] Using subfile
// 0 !HISTORY 2022-09-15 [PTadmin] Official Update 2022-05
// 
// 
// 1 16 0 0 0 1 0 0 0 1 0 0 0 1 s\3004s01.dat
  [1,16,0,0,0,1,0,0,0,1,0,0,0,1, ldraw_lib__s__3004s01()],
// 4 16 -20 24 -10 20 24 -10 20 0 -10 -20 0 -10
  [4,16,-20,24,-10,20,24,-10,20,0,-10,-20,0,-10],
];
module ldraw_lib__3004(step=0, col=false, unit=2/5, alt=false, line=0.2, solid=!$preview)
    makepoly(ldraw_lib__3004(), step=step, col=col, unit=unit, alt=alt, line=line, solid=solid);
ldraw_lib__3004(line=0.2);
// file: 190605a.scad
use <../lib.scad>
use <../p/box5-12.scad>
use <s/3004s60.scad>
$fa=1; $fs=0.2;
function ldraw_lib__190605a(realsolid=false) = [
// 0 Sticker  1.0 x  1.8 with Shell Logo White Background
// 0 Name: 190605a.dat
// 0 Author: Gerald Lasser [GeraldLasser]
// 0 !LDRAW_ORG Part UPDATE 2023-01
// 0 !LICENSE Licensed under CC BY 2.0 and CC BY 4.0 : see CAreadme.txt
// 
// 0 BFC CERTIFY CCW
  [0,"BFC","CERTIFY"],
  [0,"BFC","CCW"],
// 
// 0 !KEYWORDS Bricklink 7813stk01, Set 7813
// 
// 0 !HISTORY 2023-03-05 [OrionP] Official Update 2023-01
// 
// 
// 1 16 0 -.25 0 18 0 0 0 .25 0 0 0 10 box5-12.dat
  [1,16,0,-.25,0,18,0,0,0,.25,0,0,0,10, ldraw_lib__box5_12(realsolid)],
// 1 15 0 -.25 0 .64 0 0 0 0 1 0 -.64 0 s\3004s60.dat
  [1,15,0,-.25,0,.64,0,0,0,0,1,0,-.64,0, ldraw_lib__s__3004s60(realsolid)],
// 
// 4 15 -7.36 -.25 -1.53216 -7.36 -.25 6.72 -18 -.25 10 -18 -.25 -10
  [4,15,-7.36,-.25,-1.53216,-7.36,-.25,6.72,-18,-.25,10,-18,-.25,-10],
// 3 15 -7.36 -.25 -1.53216 -18 -.25 -10 -7.36 -.25 -6.72
  [3,15,-7.36,-.25,-1.53216,-18,-.25,-10,-7.36,-.25,-6.72],
// 4 15 0 -.25 -6.72 -7.36 -.25 -6.72 -18 -.25 -10 18 -.25 -10
  [4,15,0,-.25,-6.72,-7.36,-.25,-6.72,-18,-.25,-10,18,-.25,-10],
// 3 15 7.36 -.25 -6.72 0 -.25 -6.72 18 -.25 -10
  [3,15,7.36,-.25,-6.72,0,-.25,-6.72,18,-.25,-10],
// 4 15 7.36 -.25 -1.53216 7.36 -.25 -6.72 18 -.25 -10 18 -.25 10
  [4,15,7.36,-.25,-1.53216,7.36,-.25,-6.72,18,-.25,-10,18,-.25,10],
// 3 15 18 -.25 10 7.36 -.25 6.72 7.36 -.25 -1.53216
  [3,15,18,-.25,10,7.36,-.25,6.72,7.36,-.25,-1.53216],
// 4 15 0 -.25 6.72 7.36 -.25 6.72 18 -.25 10 -18 -.25 10
  [4,15,0,-.25,6.72,7.36,-.25,6.72,18,-.25,10,-18,-.25,10],
// 3 15 -18 -.25 10 -7.36 -.25 6.72 0 -.25 6.72
  [3,15,-18,-.25,10,-7.36,-.25,6.72,0,-.25,6.72],
];
module ldraw_lib__190605a(step=0, col=false, unit=2/5, alt=false, line=0.2, solid=!$preview)
    makepoly(ldraw_lib__190605a(solid), step=step, col=col, unit=unit, alt=alt, line=line, solid=solid);
ldraw_lib__190605a(line=0.2);
// main file
use <../lib.scad>
use <190605a.scad>
use <3004.scad>
function ldraw_lib__3004d0s() = [
// 0 Brick  1 x  2 with Shell Logo 1971 on White Background Sticker
// 0 Name: 3004d0s.dat
// 0 Author: Takeshi Takahashi [RainbowDolphin]
// 0 !LDRAW_ORG Shortcut UPDATE 2024-07
// 0 !LICENSE Licensed under CC BY 4.0 : see CAreadme.txt
// 
// 0 BFC CERTIFY CCW
  [0,"BFC","CERTIFY"],
  [0,"BFC","CCW"],
// 
// 0 !CATEGORY Sticker Shortcut
// 0 !KEYWORDS Bricklink 3004pb105, Set 7813, Train
// 
// 0 !HISTORY 2024-08-26 [OrionP] Official Update 2024-07
// 
// 1 16 0 0 0 1 0 0 0 1 0 0 0 1 3004.dat
  [1,16,0,0,0,1,0,0,0,1,0,0,0,1, ldraw_lib__3004()],
// 1 16 0 12 -10 1 0 0 0 0 -1 0 1 0 190605a.dat
  [1,16,0,12,-10,1,0,0,0,0,-1,0,1,0, ldraw_lib__190605a()],
];
module ldraw_lib__3004d0s(step=0, col=false, unit=2/5, alt=false, line=0.2, solid=!$preview)
    makepoly(ldraw_lib__3004d0s(), step=step, col=col, unit=unit, alt=alt, line=line, solid=solid);
ldraw_lib__3004d0s(line=0.2);
